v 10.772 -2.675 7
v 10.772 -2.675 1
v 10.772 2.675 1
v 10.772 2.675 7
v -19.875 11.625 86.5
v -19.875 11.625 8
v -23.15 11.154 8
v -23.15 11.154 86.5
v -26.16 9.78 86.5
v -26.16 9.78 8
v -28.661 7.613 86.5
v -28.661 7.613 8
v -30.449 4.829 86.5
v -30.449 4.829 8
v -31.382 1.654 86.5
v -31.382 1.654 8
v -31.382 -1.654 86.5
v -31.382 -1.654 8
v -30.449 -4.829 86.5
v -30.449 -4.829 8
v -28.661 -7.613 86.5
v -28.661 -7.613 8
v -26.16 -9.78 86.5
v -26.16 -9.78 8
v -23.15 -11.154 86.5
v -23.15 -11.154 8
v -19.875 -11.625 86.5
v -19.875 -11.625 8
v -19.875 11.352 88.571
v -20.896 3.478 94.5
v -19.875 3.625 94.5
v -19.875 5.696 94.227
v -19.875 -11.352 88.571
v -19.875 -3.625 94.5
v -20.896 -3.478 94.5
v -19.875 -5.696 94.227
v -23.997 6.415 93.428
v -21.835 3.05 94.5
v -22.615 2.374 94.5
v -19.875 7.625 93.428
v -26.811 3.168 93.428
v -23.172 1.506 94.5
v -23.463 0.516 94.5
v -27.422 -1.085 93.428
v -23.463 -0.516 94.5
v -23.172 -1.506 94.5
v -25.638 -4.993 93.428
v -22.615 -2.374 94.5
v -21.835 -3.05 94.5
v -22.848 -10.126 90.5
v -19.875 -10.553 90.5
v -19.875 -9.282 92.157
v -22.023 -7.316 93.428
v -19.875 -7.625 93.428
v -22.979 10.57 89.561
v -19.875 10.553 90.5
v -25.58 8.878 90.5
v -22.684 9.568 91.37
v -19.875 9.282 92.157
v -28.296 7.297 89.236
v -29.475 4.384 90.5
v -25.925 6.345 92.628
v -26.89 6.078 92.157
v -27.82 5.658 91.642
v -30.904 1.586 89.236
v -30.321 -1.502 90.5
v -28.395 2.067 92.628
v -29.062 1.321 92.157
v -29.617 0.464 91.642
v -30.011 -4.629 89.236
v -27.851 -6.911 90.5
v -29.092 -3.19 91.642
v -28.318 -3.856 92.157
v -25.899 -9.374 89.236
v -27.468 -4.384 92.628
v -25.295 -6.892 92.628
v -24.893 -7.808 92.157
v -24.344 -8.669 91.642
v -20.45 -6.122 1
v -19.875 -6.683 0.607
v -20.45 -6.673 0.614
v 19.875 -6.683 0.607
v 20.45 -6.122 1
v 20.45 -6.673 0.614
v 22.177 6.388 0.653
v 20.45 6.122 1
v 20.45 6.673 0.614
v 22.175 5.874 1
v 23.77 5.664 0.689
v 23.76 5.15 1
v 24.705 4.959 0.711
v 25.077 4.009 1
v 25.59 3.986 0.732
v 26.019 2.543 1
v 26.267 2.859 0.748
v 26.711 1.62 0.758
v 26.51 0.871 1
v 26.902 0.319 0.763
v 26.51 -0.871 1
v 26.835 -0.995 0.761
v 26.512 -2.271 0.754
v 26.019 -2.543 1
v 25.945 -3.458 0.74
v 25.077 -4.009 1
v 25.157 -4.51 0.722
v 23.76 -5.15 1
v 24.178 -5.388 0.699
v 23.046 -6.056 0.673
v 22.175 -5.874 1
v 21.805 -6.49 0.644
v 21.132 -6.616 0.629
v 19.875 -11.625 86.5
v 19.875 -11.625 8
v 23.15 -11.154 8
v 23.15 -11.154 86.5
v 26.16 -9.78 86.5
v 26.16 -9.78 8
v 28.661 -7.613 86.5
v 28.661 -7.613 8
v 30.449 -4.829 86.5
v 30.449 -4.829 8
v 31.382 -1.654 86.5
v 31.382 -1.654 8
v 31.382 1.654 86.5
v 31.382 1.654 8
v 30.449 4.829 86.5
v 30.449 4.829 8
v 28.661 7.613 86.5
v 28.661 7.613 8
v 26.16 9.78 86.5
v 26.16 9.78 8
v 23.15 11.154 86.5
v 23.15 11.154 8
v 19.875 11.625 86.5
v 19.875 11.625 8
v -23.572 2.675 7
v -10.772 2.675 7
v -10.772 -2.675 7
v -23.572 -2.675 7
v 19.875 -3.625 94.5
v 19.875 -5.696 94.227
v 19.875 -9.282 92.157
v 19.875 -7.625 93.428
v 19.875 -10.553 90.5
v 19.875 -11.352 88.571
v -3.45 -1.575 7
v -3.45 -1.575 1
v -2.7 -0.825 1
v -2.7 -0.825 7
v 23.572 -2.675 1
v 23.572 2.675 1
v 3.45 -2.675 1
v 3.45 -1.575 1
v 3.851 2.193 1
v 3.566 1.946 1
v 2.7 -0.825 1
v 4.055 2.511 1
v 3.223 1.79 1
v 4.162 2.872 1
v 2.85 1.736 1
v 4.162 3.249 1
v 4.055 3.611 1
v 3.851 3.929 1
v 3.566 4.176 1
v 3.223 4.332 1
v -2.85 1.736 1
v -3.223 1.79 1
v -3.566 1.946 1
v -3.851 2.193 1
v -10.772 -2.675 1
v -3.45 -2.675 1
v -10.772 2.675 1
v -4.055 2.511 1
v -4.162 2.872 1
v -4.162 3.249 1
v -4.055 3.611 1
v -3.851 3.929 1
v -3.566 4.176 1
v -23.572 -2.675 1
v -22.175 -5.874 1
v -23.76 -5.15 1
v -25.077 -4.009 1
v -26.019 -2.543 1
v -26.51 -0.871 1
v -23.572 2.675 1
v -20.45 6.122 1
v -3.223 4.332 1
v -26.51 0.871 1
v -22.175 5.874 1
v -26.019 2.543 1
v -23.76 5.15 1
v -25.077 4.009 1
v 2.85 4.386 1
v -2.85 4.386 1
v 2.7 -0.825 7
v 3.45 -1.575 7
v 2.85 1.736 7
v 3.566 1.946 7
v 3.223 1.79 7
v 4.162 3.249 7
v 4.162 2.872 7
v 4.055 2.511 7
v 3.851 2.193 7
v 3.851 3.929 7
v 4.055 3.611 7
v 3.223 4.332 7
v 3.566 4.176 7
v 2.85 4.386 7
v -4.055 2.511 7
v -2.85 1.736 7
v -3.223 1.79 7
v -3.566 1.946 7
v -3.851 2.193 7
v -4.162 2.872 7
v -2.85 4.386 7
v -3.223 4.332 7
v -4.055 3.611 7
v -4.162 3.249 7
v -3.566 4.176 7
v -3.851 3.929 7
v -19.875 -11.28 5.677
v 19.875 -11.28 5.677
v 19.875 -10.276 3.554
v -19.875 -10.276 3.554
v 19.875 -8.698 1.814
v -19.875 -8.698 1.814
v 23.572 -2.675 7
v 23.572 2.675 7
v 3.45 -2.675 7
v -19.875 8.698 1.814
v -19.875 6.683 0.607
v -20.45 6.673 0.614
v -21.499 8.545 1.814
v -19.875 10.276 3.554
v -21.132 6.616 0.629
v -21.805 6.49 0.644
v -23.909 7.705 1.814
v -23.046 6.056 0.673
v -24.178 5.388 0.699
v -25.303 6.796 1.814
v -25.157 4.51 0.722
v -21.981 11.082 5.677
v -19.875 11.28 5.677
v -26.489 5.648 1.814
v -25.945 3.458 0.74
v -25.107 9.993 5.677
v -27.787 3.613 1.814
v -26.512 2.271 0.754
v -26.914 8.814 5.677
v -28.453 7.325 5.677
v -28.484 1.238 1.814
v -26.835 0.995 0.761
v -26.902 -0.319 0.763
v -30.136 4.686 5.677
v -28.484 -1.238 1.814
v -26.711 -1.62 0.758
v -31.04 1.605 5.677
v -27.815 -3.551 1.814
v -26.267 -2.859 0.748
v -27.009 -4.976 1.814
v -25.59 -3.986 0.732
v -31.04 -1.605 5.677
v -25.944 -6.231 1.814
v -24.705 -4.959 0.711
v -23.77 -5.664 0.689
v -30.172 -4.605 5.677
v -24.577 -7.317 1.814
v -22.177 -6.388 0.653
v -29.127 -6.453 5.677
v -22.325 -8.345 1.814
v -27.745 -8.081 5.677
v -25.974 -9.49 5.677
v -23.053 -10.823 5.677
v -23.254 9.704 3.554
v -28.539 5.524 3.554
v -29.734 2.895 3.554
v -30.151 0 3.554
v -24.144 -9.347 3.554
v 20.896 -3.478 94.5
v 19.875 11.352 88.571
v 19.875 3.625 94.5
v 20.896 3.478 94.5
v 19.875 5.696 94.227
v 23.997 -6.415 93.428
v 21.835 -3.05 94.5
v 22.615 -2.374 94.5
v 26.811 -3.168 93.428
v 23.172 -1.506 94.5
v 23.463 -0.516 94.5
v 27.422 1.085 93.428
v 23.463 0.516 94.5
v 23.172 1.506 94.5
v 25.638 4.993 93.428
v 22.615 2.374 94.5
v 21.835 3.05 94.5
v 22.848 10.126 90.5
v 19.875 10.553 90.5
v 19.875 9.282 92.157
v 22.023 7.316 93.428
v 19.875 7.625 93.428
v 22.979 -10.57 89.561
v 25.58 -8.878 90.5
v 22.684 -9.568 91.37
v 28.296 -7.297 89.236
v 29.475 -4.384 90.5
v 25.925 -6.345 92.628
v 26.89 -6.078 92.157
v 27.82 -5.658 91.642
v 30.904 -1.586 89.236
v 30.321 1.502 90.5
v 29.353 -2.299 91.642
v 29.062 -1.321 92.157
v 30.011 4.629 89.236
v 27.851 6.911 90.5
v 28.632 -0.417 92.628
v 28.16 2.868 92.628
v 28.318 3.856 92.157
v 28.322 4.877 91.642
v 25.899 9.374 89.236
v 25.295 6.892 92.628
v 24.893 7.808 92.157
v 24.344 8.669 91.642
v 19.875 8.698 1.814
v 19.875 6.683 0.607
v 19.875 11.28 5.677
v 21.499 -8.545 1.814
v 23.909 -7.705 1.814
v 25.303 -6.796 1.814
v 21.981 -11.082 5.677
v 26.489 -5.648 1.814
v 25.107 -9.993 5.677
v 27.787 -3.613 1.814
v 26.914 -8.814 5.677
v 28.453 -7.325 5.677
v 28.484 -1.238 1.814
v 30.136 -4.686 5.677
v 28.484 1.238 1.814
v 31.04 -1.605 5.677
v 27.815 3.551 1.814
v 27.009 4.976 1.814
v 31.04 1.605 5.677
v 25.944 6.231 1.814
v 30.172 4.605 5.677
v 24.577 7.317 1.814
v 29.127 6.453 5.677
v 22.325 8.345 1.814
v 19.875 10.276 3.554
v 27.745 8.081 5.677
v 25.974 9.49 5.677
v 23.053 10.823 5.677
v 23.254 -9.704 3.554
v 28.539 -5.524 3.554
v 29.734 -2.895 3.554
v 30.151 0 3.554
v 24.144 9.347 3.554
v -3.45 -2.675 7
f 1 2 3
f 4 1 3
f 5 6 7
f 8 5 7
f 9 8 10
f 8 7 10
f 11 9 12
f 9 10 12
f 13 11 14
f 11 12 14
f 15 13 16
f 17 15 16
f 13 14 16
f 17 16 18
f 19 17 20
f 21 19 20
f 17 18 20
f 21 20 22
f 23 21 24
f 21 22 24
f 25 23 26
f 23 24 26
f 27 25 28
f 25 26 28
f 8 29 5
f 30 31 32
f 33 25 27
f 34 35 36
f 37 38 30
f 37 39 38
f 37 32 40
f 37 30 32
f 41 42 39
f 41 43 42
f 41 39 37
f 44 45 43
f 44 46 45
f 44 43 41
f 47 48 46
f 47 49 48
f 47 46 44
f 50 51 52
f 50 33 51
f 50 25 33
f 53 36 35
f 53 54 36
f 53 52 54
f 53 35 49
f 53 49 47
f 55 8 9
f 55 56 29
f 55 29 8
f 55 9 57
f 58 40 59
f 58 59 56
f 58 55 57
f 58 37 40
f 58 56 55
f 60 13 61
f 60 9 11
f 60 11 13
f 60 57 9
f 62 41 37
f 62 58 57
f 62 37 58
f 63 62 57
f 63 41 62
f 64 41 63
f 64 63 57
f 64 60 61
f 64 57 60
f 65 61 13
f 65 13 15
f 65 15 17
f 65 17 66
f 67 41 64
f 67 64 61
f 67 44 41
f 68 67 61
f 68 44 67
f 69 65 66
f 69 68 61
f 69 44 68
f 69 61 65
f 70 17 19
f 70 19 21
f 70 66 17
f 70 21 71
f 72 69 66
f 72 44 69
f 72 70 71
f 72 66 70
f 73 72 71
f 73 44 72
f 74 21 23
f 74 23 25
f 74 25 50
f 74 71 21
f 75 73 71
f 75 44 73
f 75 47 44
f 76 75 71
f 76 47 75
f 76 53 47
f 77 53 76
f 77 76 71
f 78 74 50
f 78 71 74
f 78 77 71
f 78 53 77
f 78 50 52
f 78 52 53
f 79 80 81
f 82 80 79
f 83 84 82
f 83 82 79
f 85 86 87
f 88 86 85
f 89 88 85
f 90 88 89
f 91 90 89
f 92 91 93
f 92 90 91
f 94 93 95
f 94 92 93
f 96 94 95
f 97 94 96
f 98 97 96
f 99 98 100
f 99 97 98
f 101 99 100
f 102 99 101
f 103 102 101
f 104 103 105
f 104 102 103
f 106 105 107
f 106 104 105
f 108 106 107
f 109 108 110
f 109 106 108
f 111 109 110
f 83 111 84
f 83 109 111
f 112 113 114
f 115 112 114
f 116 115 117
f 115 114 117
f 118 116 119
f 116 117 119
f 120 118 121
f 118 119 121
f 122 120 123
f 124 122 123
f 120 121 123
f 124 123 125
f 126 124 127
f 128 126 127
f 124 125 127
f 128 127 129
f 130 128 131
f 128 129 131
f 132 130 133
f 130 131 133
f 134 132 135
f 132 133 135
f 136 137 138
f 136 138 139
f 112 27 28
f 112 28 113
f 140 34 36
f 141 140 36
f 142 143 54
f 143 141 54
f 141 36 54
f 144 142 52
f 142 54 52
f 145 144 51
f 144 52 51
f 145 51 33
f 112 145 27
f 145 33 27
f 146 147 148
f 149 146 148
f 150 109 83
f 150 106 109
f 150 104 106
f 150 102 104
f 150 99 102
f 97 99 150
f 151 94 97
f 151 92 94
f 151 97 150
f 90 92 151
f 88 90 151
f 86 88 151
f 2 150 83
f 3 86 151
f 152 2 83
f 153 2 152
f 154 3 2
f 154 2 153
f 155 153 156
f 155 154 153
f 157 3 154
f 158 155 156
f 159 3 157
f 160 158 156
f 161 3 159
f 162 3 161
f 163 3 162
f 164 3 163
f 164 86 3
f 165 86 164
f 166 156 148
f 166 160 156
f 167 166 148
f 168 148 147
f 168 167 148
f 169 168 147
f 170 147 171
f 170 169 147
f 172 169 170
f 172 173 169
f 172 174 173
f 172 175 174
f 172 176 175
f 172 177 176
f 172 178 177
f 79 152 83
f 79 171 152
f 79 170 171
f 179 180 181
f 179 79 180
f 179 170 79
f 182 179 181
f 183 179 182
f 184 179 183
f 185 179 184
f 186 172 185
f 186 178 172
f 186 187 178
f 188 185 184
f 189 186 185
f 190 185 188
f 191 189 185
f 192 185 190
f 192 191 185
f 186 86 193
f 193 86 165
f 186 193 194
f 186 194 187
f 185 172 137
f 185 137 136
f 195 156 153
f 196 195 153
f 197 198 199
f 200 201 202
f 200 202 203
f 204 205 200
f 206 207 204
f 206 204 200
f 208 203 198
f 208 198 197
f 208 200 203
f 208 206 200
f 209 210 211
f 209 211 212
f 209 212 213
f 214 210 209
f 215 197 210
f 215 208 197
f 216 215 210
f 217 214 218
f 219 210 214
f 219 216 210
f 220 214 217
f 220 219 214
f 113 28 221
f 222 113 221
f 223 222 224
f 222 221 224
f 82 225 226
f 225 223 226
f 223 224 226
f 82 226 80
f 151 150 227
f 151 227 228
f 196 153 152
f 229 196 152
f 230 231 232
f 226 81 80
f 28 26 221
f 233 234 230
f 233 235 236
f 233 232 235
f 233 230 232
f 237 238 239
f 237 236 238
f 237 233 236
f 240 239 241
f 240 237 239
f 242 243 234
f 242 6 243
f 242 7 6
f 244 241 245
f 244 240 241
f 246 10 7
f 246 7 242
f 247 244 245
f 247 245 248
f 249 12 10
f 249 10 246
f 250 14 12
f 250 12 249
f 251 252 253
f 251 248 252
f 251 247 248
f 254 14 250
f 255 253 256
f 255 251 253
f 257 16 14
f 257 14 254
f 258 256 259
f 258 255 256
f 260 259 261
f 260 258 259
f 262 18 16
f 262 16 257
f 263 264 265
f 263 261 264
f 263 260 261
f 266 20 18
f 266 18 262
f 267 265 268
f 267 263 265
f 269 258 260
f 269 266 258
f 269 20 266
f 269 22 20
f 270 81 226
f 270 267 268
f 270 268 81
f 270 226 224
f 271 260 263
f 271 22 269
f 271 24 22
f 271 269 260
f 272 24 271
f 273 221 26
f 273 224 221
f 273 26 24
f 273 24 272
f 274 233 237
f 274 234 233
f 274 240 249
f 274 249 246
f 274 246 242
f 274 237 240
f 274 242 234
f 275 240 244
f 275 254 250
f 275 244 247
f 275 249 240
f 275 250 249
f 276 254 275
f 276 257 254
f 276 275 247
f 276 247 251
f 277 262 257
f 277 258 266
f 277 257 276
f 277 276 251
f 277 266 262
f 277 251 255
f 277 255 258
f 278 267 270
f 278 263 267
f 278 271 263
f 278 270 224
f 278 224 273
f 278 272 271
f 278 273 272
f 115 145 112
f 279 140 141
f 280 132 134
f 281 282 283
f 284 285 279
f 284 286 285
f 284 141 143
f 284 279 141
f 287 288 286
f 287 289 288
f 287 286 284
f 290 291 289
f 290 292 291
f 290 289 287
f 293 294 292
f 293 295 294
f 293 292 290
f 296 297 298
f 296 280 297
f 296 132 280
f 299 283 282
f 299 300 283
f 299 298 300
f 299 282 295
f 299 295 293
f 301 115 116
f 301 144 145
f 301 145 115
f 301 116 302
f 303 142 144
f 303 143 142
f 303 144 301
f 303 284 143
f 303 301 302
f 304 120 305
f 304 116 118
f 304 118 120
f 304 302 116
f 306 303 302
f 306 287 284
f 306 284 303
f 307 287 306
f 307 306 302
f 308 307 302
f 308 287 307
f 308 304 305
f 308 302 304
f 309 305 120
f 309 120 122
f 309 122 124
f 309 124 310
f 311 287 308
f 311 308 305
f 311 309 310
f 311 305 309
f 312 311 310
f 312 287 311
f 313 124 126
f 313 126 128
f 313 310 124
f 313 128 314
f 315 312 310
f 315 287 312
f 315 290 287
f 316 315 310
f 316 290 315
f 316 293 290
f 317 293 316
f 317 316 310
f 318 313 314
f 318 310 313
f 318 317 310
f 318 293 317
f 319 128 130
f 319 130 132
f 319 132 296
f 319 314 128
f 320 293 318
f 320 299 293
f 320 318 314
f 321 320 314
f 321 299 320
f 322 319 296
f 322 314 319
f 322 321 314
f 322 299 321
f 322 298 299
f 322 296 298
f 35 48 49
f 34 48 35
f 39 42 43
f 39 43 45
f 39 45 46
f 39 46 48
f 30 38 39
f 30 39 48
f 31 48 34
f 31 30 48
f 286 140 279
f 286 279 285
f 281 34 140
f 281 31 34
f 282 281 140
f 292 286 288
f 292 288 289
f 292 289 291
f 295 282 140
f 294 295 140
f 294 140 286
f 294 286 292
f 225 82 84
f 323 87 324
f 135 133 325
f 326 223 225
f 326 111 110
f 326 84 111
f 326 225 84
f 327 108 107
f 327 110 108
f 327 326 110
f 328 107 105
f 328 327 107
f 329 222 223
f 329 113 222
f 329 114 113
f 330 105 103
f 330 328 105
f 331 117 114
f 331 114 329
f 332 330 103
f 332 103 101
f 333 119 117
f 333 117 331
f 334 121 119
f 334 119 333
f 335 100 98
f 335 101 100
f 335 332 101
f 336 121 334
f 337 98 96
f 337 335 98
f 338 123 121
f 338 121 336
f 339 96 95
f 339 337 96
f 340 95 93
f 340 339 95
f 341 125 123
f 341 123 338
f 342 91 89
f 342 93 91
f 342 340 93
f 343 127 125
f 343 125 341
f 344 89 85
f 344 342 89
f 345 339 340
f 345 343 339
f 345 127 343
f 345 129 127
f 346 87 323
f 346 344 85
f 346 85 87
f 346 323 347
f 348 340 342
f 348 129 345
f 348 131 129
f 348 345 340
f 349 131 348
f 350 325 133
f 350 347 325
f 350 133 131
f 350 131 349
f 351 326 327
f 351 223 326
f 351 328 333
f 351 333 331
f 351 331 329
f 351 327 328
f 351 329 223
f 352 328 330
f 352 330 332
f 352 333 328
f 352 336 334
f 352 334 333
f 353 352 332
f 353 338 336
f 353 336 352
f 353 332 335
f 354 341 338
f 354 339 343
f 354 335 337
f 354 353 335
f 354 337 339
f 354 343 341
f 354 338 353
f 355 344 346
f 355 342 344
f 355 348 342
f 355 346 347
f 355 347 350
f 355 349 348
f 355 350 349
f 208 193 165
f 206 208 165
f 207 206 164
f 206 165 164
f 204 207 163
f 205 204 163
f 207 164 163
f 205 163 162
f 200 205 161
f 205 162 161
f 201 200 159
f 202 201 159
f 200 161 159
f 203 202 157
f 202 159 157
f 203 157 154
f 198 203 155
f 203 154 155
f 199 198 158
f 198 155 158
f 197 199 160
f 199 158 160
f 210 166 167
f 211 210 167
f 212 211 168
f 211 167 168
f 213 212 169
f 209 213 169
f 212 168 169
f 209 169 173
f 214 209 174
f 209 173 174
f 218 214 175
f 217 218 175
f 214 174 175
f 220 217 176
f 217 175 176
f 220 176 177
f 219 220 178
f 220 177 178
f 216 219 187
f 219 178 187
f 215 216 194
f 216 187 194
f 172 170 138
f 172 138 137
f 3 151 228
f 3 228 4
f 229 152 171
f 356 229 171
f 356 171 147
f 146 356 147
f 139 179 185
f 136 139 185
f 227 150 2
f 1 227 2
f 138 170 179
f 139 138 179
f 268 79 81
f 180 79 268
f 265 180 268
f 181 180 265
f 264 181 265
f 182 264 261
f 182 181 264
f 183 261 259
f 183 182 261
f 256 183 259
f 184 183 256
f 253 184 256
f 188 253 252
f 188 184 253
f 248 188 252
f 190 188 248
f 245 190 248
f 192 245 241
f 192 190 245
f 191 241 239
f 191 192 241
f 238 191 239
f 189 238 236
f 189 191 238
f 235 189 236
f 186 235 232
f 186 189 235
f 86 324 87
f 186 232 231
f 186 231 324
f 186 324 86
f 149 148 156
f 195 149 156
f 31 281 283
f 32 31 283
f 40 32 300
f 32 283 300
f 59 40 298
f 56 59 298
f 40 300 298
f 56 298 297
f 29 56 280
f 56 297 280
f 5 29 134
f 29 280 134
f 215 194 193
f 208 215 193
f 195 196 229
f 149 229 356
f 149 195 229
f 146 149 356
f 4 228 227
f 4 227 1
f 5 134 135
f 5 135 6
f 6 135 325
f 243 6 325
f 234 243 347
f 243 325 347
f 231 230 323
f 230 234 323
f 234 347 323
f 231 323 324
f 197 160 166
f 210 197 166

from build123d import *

# Parameters (mm, degrees)
BOSS_EXTRUDE1_DEPTH = 94.5
CUT_EXTRUDE1_DEPTH  = 1
CHAMFER3_SIZE       = 1.5
CHAMFER3_SIZE_2     = 1.050311307
SKETCH3_W           = 12.8
SKETCH3_H           = 5.35
CUT_EXTRUDE2_DEPTH  = 6
CUT_EXTRUDE3_DEPTH  = 6
CUT_EXTRUDE4_DEPTH  = 6
FILLET1_R           = 8


with BuildPart() as part:
    # Sketch1 → Boss-Extrude1 (new body)
    with BuildSketch(Plane.XY):
        with BuildLine():
            Line((19.875, 11.625), (-19.875, 11.625))
            ThreePointArc((-19.875, 11.625), (-31.5, 0), (-19.875, -11.625))
            Line((-19.875, -11.625), (19.875, -11.625))
            ThreePointArc((19.875, -11.625), (31.5, 0), (19.875, 11.625))
        make_face()
    extrude(amount=BOSS_EXTRUDE1_DEPTH)

    # Sketch2 → Cut-Extrude1 (cut)
    with BuildSketch(Plane(origin=(0, 0, 0), x_dir=(-1, 0, 0), z_dir=(0, 0, -1))):
        with BuildLine():
            Line((20.45, 6.05), (-20.45, 6.05))
            ThreePointArc((-20.45, 6.05), (-26.5, 0), (-20.45, -6.05))
            Line((-20.45, -6.05), (20.45, -6.05))
            ThreePointArc((20.45, -6.05), (26.5, 0), (20.45, 6.05))
        make_face()
    extrude(amount=-CUT_EXTRUDE1_DEPTH, mode=Mode.SUBTRACT)

    # Chamfer3
    # the kernel refuses this chamfer: 1.5, 1.050311307 mm, written as the material it takes off along each edge
    with BuildSketch(Plane(origin=(-20.45, 0, 0), x_dir=(0, -1, 0), z_dir=(1, 0, 0))) as chamfer3_piece_1_section:
        Polygon((6.05 + CHAMFER3_SIZE, 0), (6.05, -CHAMFER3_SIZE_2), (6.05, 0), align=None)
    chamfer3_piece_1 = revolve(axis=Axis((-20.45, 0, 0), (0, 0, -1)), revolution_arc=180, mode=Mode.PRIVATE)
    chamfer3_piece_1 = split(chamfer3_piece_1, bisect_by=Plane(origin=(-27.29545789, 0, 1), z_dir=(0, 0, -1)), keep=Keep.TOP, mode=Mode.PRIVATE)
    add(chamfer3_piece_1, mode=Mode.SUBTRACT)
    with BuildSketch(Plane(origin=(-20.45, 6.05, 0), x_dir=(0, 0.9997533347641299, -0.022209674198457065), z_dir=(1, 0, 0))) as chamfer3_piece_2_section:
        Polygon((CHAMFER3_SIZE * 0.999753334764, CHAMFER3_SIZE * 0.0222096741985), (-CHAMFER3_SIZE_2 * 0.0222096742051, CHAMFER3_SIZE_2 * 0.999753335064), (0, 0), align=None)
    chamfer3_piece_2 = extrude(amount=40.9, mode=Mode.PRIVATE)
    chamfer3_piece_2 = split(chamfer3_piece_2, bisect_by=Plane(origin=(0, 6.554046445, 1), z_dir=(0, 0, -1)), keep=Keep.TOP, mode=Mode.PRIVATE)
    add(chamfer3_piece_2, mode=Mode.SUBTRACT)
    with BuildSketch(Plane(origin=(20.45, -6.05, 0), x_dir=(0, -0.9997533347641299, -0.022209674198457065), z_dir=(-1, 0, 0))) as chamfer3_piece_3_section:
        Polygon((CHAMFER3_SIZE * 0.999753334764, CHAMFER3_SIZE * 0.0222096741985), (-CHAMFER3_SIZE_2 * 0.0222096742051, CHAMFER3_SIZE_2 * 0.999753335064), (0, 0), align=None)
    chamfer3_piece_3 = extrude(amount=40.9, mode=Mode.PRIVATE)
    chamfer3_piece_3 = split(chamfer3_piece_3, bisect_by=Plane(origin=(0, -6.554046445, 1), z_dir=(0, 0, -1)), keep=Keep.TOP, mode=Mode.PRIVATE)
    add(chamfer3_piece_3, mode=Mode.SUBTRACT)
    with BuildSketch(Plane(origin=(20.45, 0, 0), x_dir=(0, 1, 0), z_dir=(-1, 0, 0))) as chamfer3_piece_4_section:
        Polygon((6.05 + CHAMFER3_SIZE, 0), (6.05, -CHAMFER3_SIZE_2), (6.05, 0), align=None)
    chamfer3_piece_4 = revolve(axis=Axis((20.45, 0, 0), (0, 0, -1)), revolution_arc=180, mode=Mode.PRIVATE)
    chamfer3_piece_4 = split(chamfer3_piece_4, bisect_by=Plane(origin=(27.295457889, 0, 1), z_dir=(0, 0, -1)), keep=Keep.TOP, mode=Mode.PRIVATE)
    add(chamfer3_piece_4, mode=Mode.SUBTRACT)

    # Sketch3 → Cut-Extrude2 (cut)
    with BuildSketch(Plane(origin=(0, 0, 1), x_dir=(-1, 0, 0), z_dir=(0, 0, -1))):
        with Locations((-17.171851993, 0)):
            Rectangle(SKETCH3_W, SKETCH3_H)
        with Locations((17.171851993, 0)):
            Rectangle(SKETCH3_W, SKETCH3_H)
    extrude(amount=-CUT_EXTRUDE2_DEPTH, mode=Mode.SUBTRACT)

    # Sketch3<3> → Cut-Extrude3 (cut)
    with BuildSketch(Plane(origin=(0, 0, 1), x_dir=(-1, 0, 0), z_dir=(0, 0, -1))):
        Polygon((-3.45, -2.675), (3.45, -2.675), (3.45, -1.575), (2.7, -0.825), (-2.7, -0.825), (-3.45, -1.575), align=None)
    extrude(amount=-CUT_EXTRUDE3_DEPTH, mode=Mode.SUBTRACT)

    # Sketch3<4> → Cut-Extrude4 (cut)
    with BuildSketch(Plane(origin=(0, 0, 1), x_dir=(-1, 0, 0), z_dir=(0, 0, -1))):
        with BuildLine():
            Line((-2.85, 1.735925997), (2.85, 1.735925997))
            ThreePointArc((2.85, 1.735925997), (4.175, 3.060925997), (2.85, 4.385925997))
            Line((2.85, 4.385925997), (-2.85, 4.385925997))
            ThreePointArc((-2.85, 4.385925997), (-4.175, 3.060925997), (-2.85, 1.735925997))
        make_face()
    extrude(amount=-CUT_EXTRUDE4_DEPTH, mode=Mode.SUBTRACT)

    # Fillet1
    # the kernel refuses this fillet: 8 mm, written as the material it takes off along each edge
    with BuildSketch(Plane(origin=(19.875, 0, 0), x_dir=(0, -1, 0), z_dir=(-1, 0, 0))) as fillet1_piece_1:
        with BuildLine():
            CenterArc((11.625 - FILLET1_R, FILLET1_R), FILLET1_R, 270, 90)
            Line((11.625 - FILLET1_R, 0), (11.625, 0))
            Line((11.625, 0), (11.625, FILLET1_R))
        make_face()
    revolve(axis=Axis((19.875, 0, 0), (0, 0, 1)), revolution_arc=180, mode=Mode.SUBTRACT)
    with BuildSketch(Plane(origin=(-19.875, -11.625, 0), x_dir=(0, 0, 1), z_dir=(1, 0, 0)), Plane(origin=(19.875, 11.625, 94.5), x_dir=(0, -1, 0), z_dir=(-1, 0, 0))) as fillet1_piece_2:
        with BuildLine():
            CenterArc((FILLET1_R, -FILLET1_R), FILLET1_R, 90, 90)
            Line((0, -FILLET1_R), (0, 0))
            Line((0, 0), (FILLET1_R, 0))
        make_face()
    extrude(amount=39.75, mode=Mode.SUBTRACT)
    with BuildSketch(Plane(origin=(-19.875, 0, 0), x_dir=(0, 1, 0), z_dir=(1, 0, 0))) as fillet1_piece_3:
        with BuildLine():
            CenterArc((11.625 - FILLET1_R, FILLET1_R), FILLET1_R, 270, 90)
            Line((11.625 - FILLET1_R, 0), (11.625, 0))
            Line((11.625, 0), (11.625, FILLET1_R))
        make_face()
    revolve(axis=Axis((-19.875, 0, 0), (0, 0, 1)), revolution_arc=180, mode=Mode.SUBTRACT)
    with BuildSketch(Plane(origin=(19.875, 0, 94.5), x_dir=(0, -1, 0), z_dir=(-1, 0, 0))) as fillet1_piece_4:
        with BuildLine():
            CenterArc((11.625 - FILLET1_R, -FILLET1_R), FILLET1_R, 0, 90)
            Line((11.625 - FILLET1_R, 0), (11.625, 0))
            Line((11.625, 0), (11.625, -FILLET1_R))
        make_face()
    revolve(axis=Axis((19.875, 0, 94.5), (0, 0, 1)), revolution_arc=180, mode=Mode.SUBTRACT)
    with BuildSketch(Plane(origin=(-19.875, -11.625, 94.5), x_dir=(0, 0, -1), z_dir=(1, 0, 0)), Plane(origin=(19.875, 11.625, 0), x_dir=(0, -1, 0), z_dir=(-1, 0, 0))) as fillet1_piece_5:
        with BuildLine():
            CenterArc((FILLET1_R, FILLET1_R), FILLET1_R, 180, 90)
            Line((0, FILLET1_R), (0, 0))
            Line((0, 0), (FILLET1_R, 0))
        make_face()
    extrude(amount=39.75, mode=Mode.SUBTRACT)
    with BuildSketch(Plane(origin=(-19.875, 0, 94.5), x_dir=(0, 1, 0), z_dir=(1, 0, 0))) as fillet1_piece_6:
        with BuildLine():
            CenterArc((11.625 - FILLET1_R, -FILLET1_R), FILLET1_R, 0, 90)
            Line((11.625 - FILLET1_R, 0), (11.625, 0))
            Line((11.625, 0), (11.625, -FILLET1_R))
        make_face()
    revolve(axis=Axis((-19.875, 0, 94.5), (0, 0, 1)), revolution_arc=180, mode=Mode.SUBTRACT)


solid = part.part
